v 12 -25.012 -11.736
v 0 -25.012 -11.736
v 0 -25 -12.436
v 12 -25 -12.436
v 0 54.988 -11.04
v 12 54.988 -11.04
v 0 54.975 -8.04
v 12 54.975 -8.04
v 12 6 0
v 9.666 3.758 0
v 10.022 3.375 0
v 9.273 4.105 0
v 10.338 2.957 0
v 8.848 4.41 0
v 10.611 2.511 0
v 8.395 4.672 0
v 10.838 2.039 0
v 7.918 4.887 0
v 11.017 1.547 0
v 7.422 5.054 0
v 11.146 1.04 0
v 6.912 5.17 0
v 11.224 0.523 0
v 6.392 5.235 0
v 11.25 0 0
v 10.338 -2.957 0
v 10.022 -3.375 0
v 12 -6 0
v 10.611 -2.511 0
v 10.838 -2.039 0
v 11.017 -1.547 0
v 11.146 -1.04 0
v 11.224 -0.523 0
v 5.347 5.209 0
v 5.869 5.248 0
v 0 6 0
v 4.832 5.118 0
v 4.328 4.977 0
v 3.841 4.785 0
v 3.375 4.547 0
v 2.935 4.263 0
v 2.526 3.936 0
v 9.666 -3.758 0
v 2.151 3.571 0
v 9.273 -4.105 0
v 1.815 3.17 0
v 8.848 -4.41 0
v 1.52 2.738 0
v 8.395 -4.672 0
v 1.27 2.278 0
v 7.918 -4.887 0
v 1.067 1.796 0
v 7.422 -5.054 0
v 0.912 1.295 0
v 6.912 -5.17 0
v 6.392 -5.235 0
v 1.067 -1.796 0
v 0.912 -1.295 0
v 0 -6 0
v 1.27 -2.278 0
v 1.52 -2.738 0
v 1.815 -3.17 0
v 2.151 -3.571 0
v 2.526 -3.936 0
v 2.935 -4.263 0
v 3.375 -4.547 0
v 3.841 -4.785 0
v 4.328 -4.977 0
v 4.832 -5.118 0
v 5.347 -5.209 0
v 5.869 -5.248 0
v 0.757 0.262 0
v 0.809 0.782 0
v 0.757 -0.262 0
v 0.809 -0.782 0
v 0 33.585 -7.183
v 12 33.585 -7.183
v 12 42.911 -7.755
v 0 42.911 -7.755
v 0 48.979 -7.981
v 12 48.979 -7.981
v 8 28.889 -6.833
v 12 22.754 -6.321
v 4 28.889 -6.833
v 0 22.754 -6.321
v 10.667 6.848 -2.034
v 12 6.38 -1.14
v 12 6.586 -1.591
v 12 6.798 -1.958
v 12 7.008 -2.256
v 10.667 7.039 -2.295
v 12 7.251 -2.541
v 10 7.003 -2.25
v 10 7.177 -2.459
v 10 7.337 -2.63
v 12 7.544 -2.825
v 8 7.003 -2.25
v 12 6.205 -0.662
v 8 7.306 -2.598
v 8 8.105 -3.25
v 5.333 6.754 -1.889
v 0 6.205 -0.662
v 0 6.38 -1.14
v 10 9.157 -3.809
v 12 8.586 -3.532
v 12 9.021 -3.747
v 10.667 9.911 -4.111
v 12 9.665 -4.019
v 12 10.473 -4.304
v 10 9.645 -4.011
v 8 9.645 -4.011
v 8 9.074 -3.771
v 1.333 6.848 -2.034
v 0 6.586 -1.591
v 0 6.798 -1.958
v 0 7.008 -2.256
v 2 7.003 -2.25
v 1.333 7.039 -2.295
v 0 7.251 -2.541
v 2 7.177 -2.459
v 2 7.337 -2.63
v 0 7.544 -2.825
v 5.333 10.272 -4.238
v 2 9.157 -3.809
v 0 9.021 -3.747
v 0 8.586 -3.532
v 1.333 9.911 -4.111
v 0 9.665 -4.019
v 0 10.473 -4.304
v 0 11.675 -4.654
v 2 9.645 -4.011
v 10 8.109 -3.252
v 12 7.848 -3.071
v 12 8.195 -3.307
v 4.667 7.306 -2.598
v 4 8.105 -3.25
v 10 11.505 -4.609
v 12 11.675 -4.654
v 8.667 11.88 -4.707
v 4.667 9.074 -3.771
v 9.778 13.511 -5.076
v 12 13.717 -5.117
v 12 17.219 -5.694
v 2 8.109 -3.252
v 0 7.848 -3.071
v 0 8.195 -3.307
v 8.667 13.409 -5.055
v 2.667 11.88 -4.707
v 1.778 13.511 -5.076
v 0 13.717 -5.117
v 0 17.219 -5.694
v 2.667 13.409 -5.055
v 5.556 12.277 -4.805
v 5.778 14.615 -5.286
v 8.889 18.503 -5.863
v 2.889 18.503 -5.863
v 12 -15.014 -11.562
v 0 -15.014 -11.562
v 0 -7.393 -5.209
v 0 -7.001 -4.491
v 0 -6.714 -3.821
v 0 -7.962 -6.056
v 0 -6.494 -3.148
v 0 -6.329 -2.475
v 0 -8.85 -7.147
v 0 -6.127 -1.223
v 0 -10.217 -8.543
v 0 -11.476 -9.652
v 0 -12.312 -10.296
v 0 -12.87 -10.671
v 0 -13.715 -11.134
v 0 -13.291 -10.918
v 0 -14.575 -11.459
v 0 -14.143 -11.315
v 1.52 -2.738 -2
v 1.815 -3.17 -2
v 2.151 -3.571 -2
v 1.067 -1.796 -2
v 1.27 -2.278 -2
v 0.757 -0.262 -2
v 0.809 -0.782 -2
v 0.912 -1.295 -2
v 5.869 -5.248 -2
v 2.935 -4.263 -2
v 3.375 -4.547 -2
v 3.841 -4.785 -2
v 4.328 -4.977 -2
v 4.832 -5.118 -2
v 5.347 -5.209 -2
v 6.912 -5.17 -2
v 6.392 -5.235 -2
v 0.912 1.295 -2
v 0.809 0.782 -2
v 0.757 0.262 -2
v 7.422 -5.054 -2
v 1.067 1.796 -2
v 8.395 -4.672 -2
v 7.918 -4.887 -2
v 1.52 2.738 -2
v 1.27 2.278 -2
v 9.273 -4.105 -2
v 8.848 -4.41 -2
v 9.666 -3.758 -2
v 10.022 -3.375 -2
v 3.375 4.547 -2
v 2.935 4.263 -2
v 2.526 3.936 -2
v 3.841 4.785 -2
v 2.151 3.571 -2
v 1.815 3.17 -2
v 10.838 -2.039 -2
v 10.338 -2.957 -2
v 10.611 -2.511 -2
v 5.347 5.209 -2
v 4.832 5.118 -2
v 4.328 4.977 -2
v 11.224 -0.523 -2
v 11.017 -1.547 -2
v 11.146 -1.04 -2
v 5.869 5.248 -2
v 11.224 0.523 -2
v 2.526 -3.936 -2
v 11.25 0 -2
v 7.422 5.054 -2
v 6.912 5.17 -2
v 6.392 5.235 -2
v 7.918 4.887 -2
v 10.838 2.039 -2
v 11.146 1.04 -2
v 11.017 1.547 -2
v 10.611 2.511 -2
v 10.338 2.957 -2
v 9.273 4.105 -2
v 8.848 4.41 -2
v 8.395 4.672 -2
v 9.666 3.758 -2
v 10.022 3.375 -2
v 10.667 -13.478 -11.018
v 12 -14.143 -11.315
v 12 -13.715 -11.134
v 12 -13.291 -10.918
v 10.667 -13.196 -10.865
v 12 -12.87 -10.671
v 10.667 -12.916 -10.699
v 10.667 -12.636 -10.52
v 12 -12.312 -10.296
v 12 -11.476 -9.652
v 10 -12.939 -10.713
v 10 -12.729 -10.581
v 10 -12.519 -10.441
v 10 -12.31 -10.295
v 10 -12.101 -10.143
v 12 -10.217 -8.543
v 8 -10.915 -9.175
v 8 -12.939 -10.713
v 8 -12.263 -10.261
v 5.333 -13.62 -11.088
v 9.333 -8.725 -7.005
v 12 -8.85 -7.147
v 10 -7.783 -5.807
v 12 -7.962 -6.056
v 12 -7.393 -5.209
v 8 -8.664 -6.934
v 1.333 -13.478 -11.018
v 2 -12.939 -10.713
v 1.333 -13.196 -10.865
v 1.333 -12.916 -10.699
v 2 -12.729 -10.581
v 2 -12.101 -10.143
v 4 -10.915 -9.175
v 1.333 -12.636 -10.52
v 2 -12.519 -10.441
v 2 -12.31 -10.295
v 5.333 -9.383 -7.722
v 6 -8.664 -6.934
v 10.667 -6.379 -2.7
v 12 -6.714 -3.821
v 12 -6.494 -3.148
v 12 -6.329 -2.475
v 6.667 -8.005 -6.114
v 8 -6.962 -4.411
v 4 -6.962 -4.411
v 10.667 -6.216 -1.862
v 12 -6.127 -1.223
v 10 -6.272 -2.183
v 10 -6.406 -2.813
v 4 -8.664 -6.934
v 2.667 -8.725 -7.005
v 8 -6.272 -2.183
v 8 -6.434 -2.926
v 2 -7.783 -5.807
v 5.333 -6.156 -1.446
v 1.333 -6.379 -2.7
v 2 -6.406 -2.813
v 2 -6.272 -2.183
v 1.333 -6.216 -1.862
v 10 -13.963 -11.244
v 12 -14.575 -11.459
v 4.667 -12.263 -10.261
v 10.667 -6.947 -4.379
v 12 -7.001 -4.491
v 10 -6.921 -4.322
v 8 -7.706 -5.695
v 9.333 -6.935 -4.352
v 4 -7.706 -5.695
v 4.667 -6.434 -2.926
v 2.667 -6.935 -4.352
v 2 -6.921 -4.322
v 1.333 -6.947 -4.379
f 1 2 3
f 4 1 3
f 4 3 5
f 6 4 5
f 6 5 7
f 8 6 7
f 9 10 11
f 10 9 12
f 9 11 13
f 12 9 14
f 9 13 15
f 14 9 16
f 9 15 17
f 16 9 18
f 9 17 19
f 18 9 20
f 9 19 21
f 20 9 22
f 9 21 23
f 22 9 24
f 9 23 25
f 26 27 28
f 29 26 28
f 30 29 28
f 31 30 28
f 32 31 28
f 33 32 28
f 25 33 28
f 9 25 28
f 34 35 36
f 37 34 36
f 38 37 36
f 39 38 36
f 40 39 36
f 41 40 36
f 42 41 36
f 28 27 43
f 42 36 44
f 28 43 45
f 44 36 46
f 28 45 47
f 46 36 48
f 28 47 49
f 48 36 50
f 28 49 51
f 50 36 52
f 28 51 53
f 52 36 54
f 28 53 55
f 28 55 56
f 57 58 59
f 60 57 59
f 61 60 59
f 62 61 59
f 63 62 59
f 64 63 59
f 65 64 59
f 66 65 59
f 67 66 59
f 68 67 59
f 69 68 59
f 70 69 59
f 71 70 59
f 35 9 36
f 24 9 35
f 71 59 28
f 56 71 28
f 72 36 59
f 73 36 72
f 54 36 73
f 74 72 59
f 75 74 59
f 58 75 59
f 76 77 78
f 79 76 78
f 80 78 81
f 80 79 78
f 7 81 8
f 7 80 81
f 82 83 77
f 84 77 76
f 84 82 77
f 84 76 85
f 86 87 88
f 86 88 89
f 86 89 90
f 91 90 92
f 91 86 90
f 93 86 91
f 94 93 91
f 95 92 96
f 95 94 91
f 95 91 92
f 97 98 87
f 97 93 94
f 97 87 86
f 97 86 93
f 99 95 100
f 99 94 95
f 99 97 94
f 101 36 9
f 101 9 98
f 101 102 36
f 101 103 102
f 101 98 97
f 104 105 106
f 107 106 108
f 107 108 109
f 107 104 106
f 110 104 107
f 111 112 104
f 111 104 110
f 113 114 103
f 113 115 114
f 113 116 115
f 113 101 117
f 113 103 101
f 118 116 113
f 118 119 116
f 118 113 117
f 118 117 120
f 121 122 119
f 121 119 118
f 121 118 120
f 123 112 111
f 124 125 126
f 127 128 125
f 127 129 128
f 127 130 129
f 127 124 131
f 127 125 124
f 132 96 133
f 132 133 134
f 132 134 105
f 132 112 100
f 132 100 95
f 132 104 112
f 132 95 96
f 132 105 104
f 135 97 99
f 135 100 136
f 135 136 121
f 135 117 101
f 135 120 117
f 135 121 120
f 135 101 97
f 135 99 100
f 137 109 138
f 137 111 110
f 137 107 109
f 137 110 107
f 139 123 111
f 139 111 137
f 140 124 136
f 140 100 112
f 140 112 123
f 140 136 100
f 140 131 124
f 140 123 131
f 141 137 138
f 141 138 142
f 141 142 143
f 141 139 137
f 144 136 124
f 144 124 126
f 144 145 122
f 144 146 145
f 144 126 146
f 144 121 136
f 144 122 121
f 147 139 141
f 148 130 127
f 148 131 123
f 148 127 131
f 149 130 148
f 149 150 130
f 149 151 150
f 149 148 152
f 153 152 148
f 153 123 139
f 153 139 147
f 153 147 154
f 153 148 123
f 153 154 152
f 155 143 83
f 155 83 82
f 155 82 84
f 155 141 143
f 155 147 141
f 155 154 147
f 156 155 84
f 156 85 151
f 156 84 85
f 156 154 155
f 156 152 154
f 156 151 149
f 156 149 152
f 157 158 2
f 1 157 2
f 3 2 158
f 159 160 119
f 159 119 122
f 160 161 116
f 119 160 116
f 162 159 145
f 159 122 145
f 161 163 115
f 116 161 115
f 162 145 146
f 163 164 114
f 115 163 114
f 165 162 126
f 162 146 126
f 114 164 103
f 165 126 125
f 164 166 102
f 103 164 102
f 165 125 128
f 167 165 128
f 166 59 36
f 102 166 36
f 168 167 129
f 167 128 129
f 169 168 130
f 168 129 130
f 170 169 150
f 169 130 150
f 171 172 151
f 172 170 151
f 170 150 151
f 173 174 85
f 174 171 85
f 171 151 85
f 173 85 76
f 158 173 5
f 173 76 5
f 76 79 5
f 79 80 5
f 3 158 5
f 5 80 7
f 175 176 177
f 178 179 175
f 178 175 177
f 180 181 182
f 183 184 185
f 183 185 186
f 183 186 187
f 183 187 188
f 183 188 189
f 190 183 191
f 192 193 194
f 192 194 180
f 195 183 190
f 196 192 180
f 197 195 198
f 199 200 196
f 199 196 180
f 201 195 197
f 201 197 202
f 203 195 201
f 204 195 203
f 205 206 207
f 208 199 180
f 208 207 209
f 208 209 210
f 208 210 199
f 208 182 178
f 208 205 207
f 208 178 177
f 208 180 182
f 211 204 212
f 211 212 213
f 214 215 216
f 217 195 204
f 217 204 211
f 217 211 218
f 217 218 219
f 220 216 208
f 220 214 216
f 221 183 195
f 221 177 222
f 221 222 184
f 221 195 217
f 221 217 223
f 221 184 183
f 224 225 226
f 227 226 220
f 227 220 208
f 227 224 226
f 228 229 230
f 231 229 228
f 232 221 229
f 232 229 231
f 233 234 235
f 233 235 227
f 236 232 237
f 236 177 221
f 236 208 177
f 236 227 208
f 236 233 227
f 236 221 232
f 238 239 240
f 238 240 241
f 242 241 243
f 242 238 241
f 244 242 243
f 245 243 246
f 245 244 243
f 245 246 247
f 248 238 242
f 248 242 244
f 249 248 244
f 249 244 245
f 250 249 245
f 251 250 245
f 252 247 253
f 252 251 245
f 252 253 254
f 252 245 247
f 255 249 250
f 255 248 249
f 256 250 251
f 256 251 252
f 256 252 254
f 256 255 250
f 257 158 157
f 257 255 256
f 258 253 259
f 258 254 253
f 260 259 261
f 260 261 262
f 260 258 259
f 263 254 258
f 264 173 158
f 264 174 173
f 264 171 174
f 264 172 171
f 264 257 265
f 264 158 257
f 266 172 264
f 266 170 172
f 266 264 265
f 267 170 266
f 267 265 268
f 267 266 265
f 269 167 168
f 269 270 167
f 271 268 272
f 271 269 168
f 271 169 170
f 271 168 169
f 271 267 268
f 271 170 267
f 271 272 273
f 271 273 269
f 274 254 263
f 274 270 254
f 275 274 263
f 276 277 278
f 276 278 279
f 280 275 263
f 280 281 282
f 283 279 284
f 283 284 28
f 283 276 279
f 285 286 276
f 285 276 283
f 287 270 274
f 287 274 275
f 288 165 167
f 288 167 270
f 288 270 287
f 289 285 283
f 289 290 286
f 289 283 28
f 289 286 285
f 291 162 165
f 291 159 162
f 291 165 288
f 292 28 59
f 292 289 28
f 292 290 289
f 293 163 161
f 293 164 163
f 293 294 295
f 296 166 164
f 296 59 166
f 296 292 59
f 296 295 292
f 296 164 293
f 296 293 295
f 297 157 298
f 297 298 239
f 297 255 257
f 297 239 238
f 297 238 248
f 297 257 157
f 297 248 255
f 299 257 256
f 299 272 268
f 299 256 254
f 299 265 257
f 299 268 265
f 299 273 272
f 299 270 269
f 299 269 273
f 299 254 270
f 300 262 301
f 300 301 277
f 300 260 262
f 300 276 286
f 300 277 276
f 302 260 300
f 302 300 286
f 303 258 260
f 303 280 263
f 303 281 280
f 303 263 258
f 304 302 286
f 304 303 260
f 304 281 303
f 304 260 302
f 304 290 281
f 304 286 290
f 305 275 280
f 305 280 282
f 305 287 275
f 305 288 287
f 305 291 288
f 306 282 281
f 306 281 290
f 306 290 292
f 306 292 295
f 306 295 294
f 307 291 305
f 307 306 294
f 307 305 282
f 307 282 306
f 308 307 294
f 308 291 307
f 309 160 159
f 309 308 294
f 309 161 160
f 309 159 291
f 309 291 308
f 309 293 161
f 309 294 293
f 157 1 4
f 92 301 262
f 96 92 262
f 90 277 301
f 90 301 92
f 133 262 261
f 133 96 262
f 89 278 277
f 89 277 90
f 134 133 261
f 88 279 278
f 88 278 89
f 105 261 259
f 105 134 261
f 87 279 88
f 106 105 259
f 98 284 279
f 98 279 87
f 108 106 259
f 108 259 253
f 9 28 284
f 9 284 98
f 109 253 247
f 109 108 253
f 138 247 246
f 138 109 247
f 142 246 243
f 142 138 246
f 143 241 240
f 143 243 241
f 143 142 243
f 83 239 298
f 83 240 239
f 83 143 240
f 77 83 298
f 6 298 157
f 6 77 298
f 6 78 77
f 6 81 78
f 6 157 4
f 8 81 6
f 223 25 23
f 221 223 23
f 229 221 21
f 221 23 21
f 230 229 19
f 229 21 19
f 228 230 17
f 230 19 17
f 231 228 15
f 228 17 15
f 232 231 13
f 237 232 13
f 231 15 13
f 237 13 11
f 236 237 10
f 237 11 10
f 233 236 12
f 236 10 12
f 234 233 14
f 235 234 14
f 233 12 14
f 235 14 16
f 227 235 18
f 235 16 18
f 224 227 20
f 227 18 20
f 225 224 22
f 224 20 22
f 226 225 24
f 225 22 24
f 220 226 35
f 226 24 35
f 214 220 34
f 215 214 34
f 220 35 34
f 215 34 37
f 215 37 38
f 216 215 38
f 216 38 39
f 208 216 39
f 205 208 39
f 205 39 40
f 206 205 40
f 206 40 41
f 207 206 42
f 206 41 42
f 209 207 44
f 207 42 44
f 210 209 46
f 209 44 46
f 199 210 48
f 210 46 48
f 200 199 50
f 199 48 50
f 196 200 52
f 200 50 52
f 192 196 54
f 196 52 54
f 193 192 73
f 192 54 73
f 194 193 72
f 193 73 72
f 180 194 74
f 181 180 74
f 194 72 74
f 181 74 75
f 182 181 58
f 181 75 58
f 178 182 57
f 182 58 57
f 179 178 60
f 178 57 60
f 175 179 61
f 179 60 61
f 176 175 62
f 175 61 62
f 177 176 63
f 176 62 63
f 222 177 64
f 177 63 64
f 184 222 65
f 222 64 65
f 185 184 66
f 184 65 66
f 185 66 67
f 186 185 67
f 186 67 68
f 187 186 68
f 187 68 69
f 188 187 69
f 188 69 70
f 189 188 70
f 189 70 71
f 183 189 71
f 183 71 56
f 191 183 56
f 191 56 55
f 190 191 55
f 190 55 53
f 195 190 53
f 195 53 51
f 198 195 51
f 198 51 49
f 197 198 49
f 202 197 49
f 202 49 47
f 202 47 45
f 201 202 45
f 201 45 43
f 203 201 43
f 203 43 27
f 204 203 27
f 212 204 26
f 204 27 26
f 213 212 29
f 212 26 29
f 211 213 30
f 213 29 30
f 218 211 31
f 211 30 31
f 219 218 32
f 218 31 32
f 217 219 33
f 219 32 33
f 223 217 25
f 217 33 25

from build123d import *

# Parameters (mm, degrees)
F1_DEPTH = 12
F2_R     = 5.25
F3_DEPTH = 2


with BuildPart() as f1:
    # F0 (on Right) → F1 (new body)
    with BuildSketch(Plane.YZ):
        with BuildLine():
            Line((6, 0), (-6, 0))
            add(Edge.make_bspline(
                [(-15.0137397329, -11.5619591722), (-13.5906271424, -11.2964920093), (-10.7601897079, -9.2903086336), (-6.4181021832, -4.7073575718), (-6.1370336878, -1.4182246783), (-6, 0)],
                knots=[0, 0, 0, 0, 0.3207224524, 0.6871017532, 1, 1, 1, 1], degree=3))
            Line((-15.0137397329, -11.5619591722), (-25.0122166845, -11.7364832366))
            Line((-25.0122166845, -11.7364832366), (-25, -12.4363766232))
            Line((-25, -12.4363766232), (54.9878156125, -11.0401841082))
            Line((54.9878156125, -11.0401841082), (54.9748430875, -8.0402121561))
            add(Edge.make_bspline(
                [(6, 0), (6.3458147236, -1.1588554342), (7.4985462399, -5.0603049881), (30.6654186689, -7.0675654114), (46.5840497498, -8.0880688799), (54.9748430875, -8.0402121561)],
                knots=[0, 0, 0, 0, 0.1686157391, 0.5621249017, 1, 1, 1, 1], degree=3))
        make_face()
    extrude(amount=F1_DEPTH)

    # F2 (on face) → F3 (cut)
    with BuildSketch(Plane.XY):
        with Locations((6, 0)):
            Circle(F2_R)
    extrude(amount=-F3_DEPTH, mode=Mode.SUBTRACT)


solid = f1.part
